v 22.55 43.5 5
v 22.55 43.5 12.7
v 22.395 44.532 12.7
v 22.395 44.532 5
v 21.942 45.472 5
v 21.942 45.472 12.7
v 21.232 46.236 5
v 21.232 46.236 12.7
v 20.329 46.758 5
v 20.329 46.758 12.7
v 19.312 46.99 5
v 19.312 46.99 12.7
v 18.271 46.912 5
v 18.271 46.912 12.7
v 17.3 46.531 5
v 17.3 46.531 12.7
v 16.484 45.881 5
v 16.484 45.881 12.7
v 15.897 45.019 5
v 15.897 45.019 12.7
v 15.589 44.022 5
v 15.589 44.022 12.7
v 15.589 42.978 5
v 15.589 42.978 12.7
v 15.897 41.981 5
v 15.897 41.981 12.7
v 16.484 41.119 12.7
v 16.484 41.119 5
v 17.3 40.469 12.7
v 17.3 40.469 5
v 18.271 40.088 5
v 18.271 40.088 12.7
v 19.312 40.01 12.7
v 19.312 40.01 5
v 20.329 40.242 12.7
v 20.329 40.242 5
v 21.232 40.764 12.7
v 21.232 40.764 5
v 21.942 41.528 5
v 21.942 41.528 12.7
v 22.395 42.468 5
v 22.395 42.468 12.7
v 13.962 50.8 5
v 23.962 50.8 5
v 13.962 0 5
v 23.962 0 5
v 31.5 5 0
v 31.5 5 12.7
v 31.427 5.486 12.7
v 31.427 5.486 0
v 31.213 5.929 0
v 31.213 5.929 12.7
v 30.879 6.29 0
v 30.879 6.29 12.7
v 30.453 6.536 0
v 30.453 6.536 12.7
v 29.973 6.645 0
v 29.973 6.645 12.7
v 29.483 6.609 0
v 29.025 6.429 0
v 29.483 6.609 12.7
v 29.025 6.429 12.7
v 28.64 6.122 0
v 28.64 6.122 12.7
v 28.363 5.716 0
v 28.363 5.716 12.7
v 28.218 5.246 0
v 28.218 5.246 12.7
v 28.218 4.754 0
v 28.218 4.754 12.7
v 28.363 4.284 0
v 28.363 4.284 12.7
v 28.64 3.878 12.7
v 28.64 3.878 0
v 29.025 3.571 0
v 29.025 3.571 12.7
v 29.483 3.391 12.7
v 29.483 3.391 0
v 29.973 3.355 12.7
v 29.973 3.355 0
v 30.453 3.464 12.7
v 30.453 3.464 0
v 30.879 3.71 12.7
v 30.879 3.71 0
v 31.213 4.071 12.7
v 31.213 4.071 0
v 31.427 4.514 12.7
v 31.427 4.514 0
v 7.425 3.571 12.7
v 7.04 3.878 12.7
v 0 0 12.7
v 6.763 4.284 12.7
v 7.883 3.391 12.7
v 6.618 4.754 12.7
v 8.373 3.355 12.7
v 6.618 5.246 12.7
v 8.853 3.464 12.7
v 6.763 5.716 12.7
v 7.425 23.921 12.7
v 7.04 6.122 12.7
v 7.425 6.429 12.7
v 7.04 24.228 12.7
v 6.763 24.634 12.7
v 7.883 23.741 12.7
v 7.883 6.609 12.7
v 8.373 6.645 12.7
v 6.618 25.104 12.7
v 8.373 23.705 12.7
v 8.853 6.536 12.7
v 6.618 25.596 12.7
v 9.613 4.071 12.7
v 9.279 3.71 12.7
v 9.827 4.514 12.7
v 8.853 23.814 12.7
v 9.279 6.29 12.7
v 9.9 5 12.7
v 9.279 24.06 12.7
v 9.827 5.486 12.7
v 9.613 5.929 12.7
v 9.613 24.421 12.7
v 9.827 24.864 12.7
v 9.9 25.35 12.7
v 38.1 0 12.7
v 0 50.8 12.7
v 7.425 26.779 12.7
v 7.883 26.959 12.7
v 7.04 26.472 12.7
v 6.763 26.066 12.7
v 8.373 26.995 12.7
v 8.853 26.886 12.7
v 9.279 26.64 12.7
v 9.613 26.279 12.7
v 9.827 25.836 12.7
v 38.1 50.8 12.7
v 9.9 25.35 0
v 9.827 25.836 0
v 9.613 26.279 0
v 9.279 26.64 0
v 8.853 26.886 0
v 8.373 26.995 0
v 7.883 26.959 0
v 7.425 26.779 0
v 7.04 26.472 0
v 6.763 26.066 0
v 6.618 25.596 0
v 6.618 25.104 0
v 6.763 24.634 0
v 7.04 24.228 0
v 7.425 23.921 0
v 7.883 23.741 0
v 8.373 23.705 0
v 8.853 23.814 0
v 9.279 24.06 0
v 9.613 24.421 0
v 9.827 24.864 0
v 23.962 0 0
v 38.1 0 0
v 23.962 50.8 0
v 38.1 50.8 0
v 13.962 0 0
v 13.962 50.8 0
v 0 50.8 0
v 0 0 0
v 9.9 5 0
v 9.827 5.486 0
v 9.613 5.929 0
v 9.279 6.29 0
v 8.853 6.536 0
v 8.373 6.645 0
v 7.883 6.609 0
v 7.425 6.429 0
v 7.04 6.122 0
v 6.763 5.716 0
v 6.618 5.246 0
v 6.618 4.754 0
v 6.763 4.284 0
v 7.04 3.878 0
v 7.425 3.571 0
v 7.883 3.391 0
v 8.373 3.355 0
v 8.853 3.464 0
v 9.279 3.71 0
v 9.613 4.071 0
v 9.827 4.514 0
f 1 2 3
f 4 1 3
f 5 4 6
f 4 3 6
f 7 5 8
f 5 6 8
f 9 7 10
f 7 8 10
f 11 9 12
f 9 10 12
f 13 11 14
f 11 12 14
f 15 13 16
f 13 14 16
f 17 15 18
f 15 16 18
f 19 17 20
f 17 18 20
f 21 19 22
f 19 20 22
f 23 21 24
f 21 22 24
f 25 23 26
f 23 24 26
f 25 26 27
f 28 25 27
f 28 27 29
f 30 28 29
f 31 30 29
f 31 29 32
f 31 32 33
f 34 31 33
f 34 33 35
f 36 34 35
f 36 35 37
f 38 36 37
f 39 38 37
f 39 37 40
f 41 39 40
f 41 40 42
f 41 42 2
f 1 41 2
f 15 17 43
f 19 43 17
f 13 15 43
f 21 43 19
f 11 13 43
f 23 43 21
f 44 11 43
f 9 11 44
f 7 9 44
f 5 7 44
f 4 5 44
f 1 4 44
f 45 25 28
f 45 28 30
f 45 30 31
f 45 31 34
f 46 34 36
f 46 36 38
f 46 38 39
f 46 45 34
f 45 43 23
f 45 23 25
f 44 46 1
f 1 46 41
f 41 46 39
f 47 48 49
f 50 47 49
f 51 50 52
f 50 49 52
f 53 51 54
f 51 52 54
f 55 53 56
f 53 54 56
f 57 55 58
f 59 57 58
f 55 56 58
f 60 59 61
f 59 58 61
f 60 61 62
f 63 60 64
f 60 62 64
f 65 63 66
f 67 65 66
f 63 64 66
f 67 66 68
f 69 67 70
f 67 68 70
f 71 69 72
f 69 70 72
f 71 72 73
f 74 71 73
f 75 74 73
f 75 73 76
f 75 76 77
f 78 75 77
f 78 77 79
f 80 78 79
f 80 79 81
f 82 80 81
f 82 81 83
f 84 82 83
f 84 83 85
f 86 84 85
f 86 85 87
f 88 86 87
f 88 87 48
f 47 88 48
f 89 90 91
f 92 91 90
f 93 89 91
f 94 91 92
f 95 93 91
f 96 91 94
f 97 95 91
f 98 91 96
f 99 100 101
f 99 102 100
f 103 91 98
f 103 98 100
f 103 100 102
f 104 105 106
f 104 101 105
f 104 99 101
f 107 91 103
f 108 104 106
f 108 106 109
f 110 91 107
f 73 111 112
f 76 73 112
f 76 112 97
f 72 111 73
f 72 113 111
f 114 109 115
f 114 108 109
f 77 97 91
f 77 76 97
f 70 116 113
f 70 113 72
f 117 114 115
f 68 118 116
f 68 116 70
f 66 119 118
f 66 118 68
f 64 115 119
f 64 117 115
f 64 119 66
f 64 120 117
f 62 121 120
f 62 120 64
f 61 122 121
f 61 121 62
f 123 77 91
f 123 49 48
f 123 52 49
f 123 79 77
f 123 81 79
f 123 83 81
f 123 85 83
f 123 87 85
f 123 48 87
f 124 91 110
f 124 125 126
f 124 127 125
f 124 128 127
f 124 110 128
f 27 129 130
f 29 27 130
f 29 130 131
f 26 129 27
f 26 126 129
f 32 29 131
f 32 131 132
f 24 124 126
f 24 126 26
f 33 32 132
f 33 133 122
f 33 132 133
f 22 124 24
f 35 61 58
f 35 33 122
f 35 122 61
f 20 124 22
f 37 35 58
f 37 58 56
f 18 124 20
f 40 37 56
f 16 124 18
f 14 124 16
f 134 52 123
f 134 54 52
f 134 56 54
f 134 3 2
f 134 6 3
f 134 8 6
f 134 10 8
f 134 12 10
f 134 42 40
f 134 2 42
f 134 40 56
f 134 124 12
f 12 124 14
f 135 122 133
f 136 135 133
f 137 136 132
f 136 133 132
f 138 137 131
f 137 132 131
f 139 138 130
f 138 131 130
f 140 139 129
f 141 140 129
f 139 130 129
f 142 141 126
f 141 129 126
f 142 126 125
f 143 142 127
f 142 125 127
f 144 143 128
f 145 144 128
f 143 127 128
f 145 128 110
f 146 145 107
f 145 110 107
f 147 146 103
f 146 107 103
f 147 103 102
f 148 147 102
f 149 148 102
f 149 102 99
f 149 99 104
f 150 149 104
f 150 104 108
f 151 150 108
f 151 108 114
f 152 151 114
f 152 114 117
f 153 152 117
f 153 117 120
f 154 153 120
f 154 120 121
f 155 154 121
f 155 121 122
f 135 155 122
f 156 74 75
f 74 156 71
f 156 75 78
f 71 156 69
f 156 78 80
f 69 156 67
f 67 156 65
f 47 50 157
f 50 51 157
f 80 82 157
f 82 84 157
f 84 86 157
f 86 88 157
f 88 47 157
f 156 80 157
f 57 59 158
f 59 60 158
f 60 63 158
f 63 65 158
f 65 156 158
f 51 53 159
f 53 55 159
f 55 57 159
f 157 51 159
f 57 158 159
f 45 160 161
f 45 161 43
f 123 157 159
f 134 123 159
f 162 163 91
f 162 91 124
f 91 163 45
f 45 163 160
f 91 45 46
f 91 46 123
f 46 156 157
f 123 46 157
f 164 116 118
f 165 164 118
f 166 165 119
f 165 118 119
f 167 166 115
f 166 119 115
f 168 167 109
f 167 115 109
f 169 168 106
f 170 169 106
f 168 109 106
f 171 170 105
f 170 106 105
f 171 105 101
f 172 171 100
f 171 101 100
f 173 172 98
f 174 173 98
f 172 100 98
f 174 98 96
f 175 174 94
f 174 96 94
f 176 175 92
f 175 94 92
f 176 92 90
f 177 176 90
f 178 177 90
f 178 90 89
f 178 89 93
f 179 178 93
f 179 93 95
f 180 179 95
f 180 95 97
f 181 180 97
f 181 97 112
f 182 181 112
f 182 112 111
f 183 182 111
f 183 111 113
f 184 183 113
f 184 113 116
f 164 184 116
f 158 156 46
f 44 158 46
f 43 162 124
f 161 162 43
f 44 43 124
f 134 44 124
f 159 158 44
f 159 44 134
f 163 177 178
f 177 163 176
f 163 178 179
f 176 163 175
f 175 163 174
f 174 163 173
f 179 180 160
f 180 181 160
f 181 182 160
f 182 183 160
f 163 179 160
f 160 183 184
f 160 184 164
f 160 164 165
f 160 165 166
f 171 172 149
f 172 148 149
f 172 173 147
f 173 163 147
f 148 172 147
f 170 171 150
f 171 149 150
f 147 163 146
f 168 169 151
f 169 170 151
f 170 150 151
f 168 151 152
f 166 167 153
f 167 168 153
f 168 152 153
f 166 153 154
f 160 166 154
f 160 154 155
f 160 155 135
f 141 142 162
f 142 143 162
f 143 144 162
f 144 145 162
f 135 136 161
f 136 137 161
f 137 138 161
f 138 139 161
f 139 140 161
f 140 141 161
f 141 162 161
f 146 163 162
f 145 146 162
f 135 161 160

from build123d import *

# Parameters (mm, degrees)
F0_W     = 38.1
F0_H     = 50.8
F1_DEPTH = 12.7
F2_R     = 1.65
F2_R_2   = 3.5
F3_DEPTH = 12.701
F4_W     = 10
F4_H     = 5
F5_DEPTH = 50.801


with BuildPart() as f1:
    # F0 (on Top) → F1 (new body)
    with BuildSketch(Plane.XY):
        with Locations((19.05, 25.4)):
            Rectangle(F0_W, F0_H)
    extrude(amount=F1_DEPTH)

    # F2 (on face) → F3 (cut, through all)
    with BuildSketch(Plane.XY.offset(12.7)):
        with Locations((8.25, 5)):
            Circle(F2_R)
        with Locations((29.85, 5)):
            Circle(F2_R)
        with Locations((8.25, 25.35)):
            Circle(F2_R)
        with Locations((19.05, 43.5)):
            Circle(F2_R_2)
    extrude(amount=-F3_DEPTH, mode=Mode.SUBTRACT)

    # F4 (on face) → F5 (cut, through all)
    with BuildSketch(Plane.XZ):
        with Locations((18.962298, 2.5)):
            Rectangle(F4_W, F4_H)
    extrude(amount=-F5_DEPTH, mode=Mode.SUBTRACT)


solid = f1.part
